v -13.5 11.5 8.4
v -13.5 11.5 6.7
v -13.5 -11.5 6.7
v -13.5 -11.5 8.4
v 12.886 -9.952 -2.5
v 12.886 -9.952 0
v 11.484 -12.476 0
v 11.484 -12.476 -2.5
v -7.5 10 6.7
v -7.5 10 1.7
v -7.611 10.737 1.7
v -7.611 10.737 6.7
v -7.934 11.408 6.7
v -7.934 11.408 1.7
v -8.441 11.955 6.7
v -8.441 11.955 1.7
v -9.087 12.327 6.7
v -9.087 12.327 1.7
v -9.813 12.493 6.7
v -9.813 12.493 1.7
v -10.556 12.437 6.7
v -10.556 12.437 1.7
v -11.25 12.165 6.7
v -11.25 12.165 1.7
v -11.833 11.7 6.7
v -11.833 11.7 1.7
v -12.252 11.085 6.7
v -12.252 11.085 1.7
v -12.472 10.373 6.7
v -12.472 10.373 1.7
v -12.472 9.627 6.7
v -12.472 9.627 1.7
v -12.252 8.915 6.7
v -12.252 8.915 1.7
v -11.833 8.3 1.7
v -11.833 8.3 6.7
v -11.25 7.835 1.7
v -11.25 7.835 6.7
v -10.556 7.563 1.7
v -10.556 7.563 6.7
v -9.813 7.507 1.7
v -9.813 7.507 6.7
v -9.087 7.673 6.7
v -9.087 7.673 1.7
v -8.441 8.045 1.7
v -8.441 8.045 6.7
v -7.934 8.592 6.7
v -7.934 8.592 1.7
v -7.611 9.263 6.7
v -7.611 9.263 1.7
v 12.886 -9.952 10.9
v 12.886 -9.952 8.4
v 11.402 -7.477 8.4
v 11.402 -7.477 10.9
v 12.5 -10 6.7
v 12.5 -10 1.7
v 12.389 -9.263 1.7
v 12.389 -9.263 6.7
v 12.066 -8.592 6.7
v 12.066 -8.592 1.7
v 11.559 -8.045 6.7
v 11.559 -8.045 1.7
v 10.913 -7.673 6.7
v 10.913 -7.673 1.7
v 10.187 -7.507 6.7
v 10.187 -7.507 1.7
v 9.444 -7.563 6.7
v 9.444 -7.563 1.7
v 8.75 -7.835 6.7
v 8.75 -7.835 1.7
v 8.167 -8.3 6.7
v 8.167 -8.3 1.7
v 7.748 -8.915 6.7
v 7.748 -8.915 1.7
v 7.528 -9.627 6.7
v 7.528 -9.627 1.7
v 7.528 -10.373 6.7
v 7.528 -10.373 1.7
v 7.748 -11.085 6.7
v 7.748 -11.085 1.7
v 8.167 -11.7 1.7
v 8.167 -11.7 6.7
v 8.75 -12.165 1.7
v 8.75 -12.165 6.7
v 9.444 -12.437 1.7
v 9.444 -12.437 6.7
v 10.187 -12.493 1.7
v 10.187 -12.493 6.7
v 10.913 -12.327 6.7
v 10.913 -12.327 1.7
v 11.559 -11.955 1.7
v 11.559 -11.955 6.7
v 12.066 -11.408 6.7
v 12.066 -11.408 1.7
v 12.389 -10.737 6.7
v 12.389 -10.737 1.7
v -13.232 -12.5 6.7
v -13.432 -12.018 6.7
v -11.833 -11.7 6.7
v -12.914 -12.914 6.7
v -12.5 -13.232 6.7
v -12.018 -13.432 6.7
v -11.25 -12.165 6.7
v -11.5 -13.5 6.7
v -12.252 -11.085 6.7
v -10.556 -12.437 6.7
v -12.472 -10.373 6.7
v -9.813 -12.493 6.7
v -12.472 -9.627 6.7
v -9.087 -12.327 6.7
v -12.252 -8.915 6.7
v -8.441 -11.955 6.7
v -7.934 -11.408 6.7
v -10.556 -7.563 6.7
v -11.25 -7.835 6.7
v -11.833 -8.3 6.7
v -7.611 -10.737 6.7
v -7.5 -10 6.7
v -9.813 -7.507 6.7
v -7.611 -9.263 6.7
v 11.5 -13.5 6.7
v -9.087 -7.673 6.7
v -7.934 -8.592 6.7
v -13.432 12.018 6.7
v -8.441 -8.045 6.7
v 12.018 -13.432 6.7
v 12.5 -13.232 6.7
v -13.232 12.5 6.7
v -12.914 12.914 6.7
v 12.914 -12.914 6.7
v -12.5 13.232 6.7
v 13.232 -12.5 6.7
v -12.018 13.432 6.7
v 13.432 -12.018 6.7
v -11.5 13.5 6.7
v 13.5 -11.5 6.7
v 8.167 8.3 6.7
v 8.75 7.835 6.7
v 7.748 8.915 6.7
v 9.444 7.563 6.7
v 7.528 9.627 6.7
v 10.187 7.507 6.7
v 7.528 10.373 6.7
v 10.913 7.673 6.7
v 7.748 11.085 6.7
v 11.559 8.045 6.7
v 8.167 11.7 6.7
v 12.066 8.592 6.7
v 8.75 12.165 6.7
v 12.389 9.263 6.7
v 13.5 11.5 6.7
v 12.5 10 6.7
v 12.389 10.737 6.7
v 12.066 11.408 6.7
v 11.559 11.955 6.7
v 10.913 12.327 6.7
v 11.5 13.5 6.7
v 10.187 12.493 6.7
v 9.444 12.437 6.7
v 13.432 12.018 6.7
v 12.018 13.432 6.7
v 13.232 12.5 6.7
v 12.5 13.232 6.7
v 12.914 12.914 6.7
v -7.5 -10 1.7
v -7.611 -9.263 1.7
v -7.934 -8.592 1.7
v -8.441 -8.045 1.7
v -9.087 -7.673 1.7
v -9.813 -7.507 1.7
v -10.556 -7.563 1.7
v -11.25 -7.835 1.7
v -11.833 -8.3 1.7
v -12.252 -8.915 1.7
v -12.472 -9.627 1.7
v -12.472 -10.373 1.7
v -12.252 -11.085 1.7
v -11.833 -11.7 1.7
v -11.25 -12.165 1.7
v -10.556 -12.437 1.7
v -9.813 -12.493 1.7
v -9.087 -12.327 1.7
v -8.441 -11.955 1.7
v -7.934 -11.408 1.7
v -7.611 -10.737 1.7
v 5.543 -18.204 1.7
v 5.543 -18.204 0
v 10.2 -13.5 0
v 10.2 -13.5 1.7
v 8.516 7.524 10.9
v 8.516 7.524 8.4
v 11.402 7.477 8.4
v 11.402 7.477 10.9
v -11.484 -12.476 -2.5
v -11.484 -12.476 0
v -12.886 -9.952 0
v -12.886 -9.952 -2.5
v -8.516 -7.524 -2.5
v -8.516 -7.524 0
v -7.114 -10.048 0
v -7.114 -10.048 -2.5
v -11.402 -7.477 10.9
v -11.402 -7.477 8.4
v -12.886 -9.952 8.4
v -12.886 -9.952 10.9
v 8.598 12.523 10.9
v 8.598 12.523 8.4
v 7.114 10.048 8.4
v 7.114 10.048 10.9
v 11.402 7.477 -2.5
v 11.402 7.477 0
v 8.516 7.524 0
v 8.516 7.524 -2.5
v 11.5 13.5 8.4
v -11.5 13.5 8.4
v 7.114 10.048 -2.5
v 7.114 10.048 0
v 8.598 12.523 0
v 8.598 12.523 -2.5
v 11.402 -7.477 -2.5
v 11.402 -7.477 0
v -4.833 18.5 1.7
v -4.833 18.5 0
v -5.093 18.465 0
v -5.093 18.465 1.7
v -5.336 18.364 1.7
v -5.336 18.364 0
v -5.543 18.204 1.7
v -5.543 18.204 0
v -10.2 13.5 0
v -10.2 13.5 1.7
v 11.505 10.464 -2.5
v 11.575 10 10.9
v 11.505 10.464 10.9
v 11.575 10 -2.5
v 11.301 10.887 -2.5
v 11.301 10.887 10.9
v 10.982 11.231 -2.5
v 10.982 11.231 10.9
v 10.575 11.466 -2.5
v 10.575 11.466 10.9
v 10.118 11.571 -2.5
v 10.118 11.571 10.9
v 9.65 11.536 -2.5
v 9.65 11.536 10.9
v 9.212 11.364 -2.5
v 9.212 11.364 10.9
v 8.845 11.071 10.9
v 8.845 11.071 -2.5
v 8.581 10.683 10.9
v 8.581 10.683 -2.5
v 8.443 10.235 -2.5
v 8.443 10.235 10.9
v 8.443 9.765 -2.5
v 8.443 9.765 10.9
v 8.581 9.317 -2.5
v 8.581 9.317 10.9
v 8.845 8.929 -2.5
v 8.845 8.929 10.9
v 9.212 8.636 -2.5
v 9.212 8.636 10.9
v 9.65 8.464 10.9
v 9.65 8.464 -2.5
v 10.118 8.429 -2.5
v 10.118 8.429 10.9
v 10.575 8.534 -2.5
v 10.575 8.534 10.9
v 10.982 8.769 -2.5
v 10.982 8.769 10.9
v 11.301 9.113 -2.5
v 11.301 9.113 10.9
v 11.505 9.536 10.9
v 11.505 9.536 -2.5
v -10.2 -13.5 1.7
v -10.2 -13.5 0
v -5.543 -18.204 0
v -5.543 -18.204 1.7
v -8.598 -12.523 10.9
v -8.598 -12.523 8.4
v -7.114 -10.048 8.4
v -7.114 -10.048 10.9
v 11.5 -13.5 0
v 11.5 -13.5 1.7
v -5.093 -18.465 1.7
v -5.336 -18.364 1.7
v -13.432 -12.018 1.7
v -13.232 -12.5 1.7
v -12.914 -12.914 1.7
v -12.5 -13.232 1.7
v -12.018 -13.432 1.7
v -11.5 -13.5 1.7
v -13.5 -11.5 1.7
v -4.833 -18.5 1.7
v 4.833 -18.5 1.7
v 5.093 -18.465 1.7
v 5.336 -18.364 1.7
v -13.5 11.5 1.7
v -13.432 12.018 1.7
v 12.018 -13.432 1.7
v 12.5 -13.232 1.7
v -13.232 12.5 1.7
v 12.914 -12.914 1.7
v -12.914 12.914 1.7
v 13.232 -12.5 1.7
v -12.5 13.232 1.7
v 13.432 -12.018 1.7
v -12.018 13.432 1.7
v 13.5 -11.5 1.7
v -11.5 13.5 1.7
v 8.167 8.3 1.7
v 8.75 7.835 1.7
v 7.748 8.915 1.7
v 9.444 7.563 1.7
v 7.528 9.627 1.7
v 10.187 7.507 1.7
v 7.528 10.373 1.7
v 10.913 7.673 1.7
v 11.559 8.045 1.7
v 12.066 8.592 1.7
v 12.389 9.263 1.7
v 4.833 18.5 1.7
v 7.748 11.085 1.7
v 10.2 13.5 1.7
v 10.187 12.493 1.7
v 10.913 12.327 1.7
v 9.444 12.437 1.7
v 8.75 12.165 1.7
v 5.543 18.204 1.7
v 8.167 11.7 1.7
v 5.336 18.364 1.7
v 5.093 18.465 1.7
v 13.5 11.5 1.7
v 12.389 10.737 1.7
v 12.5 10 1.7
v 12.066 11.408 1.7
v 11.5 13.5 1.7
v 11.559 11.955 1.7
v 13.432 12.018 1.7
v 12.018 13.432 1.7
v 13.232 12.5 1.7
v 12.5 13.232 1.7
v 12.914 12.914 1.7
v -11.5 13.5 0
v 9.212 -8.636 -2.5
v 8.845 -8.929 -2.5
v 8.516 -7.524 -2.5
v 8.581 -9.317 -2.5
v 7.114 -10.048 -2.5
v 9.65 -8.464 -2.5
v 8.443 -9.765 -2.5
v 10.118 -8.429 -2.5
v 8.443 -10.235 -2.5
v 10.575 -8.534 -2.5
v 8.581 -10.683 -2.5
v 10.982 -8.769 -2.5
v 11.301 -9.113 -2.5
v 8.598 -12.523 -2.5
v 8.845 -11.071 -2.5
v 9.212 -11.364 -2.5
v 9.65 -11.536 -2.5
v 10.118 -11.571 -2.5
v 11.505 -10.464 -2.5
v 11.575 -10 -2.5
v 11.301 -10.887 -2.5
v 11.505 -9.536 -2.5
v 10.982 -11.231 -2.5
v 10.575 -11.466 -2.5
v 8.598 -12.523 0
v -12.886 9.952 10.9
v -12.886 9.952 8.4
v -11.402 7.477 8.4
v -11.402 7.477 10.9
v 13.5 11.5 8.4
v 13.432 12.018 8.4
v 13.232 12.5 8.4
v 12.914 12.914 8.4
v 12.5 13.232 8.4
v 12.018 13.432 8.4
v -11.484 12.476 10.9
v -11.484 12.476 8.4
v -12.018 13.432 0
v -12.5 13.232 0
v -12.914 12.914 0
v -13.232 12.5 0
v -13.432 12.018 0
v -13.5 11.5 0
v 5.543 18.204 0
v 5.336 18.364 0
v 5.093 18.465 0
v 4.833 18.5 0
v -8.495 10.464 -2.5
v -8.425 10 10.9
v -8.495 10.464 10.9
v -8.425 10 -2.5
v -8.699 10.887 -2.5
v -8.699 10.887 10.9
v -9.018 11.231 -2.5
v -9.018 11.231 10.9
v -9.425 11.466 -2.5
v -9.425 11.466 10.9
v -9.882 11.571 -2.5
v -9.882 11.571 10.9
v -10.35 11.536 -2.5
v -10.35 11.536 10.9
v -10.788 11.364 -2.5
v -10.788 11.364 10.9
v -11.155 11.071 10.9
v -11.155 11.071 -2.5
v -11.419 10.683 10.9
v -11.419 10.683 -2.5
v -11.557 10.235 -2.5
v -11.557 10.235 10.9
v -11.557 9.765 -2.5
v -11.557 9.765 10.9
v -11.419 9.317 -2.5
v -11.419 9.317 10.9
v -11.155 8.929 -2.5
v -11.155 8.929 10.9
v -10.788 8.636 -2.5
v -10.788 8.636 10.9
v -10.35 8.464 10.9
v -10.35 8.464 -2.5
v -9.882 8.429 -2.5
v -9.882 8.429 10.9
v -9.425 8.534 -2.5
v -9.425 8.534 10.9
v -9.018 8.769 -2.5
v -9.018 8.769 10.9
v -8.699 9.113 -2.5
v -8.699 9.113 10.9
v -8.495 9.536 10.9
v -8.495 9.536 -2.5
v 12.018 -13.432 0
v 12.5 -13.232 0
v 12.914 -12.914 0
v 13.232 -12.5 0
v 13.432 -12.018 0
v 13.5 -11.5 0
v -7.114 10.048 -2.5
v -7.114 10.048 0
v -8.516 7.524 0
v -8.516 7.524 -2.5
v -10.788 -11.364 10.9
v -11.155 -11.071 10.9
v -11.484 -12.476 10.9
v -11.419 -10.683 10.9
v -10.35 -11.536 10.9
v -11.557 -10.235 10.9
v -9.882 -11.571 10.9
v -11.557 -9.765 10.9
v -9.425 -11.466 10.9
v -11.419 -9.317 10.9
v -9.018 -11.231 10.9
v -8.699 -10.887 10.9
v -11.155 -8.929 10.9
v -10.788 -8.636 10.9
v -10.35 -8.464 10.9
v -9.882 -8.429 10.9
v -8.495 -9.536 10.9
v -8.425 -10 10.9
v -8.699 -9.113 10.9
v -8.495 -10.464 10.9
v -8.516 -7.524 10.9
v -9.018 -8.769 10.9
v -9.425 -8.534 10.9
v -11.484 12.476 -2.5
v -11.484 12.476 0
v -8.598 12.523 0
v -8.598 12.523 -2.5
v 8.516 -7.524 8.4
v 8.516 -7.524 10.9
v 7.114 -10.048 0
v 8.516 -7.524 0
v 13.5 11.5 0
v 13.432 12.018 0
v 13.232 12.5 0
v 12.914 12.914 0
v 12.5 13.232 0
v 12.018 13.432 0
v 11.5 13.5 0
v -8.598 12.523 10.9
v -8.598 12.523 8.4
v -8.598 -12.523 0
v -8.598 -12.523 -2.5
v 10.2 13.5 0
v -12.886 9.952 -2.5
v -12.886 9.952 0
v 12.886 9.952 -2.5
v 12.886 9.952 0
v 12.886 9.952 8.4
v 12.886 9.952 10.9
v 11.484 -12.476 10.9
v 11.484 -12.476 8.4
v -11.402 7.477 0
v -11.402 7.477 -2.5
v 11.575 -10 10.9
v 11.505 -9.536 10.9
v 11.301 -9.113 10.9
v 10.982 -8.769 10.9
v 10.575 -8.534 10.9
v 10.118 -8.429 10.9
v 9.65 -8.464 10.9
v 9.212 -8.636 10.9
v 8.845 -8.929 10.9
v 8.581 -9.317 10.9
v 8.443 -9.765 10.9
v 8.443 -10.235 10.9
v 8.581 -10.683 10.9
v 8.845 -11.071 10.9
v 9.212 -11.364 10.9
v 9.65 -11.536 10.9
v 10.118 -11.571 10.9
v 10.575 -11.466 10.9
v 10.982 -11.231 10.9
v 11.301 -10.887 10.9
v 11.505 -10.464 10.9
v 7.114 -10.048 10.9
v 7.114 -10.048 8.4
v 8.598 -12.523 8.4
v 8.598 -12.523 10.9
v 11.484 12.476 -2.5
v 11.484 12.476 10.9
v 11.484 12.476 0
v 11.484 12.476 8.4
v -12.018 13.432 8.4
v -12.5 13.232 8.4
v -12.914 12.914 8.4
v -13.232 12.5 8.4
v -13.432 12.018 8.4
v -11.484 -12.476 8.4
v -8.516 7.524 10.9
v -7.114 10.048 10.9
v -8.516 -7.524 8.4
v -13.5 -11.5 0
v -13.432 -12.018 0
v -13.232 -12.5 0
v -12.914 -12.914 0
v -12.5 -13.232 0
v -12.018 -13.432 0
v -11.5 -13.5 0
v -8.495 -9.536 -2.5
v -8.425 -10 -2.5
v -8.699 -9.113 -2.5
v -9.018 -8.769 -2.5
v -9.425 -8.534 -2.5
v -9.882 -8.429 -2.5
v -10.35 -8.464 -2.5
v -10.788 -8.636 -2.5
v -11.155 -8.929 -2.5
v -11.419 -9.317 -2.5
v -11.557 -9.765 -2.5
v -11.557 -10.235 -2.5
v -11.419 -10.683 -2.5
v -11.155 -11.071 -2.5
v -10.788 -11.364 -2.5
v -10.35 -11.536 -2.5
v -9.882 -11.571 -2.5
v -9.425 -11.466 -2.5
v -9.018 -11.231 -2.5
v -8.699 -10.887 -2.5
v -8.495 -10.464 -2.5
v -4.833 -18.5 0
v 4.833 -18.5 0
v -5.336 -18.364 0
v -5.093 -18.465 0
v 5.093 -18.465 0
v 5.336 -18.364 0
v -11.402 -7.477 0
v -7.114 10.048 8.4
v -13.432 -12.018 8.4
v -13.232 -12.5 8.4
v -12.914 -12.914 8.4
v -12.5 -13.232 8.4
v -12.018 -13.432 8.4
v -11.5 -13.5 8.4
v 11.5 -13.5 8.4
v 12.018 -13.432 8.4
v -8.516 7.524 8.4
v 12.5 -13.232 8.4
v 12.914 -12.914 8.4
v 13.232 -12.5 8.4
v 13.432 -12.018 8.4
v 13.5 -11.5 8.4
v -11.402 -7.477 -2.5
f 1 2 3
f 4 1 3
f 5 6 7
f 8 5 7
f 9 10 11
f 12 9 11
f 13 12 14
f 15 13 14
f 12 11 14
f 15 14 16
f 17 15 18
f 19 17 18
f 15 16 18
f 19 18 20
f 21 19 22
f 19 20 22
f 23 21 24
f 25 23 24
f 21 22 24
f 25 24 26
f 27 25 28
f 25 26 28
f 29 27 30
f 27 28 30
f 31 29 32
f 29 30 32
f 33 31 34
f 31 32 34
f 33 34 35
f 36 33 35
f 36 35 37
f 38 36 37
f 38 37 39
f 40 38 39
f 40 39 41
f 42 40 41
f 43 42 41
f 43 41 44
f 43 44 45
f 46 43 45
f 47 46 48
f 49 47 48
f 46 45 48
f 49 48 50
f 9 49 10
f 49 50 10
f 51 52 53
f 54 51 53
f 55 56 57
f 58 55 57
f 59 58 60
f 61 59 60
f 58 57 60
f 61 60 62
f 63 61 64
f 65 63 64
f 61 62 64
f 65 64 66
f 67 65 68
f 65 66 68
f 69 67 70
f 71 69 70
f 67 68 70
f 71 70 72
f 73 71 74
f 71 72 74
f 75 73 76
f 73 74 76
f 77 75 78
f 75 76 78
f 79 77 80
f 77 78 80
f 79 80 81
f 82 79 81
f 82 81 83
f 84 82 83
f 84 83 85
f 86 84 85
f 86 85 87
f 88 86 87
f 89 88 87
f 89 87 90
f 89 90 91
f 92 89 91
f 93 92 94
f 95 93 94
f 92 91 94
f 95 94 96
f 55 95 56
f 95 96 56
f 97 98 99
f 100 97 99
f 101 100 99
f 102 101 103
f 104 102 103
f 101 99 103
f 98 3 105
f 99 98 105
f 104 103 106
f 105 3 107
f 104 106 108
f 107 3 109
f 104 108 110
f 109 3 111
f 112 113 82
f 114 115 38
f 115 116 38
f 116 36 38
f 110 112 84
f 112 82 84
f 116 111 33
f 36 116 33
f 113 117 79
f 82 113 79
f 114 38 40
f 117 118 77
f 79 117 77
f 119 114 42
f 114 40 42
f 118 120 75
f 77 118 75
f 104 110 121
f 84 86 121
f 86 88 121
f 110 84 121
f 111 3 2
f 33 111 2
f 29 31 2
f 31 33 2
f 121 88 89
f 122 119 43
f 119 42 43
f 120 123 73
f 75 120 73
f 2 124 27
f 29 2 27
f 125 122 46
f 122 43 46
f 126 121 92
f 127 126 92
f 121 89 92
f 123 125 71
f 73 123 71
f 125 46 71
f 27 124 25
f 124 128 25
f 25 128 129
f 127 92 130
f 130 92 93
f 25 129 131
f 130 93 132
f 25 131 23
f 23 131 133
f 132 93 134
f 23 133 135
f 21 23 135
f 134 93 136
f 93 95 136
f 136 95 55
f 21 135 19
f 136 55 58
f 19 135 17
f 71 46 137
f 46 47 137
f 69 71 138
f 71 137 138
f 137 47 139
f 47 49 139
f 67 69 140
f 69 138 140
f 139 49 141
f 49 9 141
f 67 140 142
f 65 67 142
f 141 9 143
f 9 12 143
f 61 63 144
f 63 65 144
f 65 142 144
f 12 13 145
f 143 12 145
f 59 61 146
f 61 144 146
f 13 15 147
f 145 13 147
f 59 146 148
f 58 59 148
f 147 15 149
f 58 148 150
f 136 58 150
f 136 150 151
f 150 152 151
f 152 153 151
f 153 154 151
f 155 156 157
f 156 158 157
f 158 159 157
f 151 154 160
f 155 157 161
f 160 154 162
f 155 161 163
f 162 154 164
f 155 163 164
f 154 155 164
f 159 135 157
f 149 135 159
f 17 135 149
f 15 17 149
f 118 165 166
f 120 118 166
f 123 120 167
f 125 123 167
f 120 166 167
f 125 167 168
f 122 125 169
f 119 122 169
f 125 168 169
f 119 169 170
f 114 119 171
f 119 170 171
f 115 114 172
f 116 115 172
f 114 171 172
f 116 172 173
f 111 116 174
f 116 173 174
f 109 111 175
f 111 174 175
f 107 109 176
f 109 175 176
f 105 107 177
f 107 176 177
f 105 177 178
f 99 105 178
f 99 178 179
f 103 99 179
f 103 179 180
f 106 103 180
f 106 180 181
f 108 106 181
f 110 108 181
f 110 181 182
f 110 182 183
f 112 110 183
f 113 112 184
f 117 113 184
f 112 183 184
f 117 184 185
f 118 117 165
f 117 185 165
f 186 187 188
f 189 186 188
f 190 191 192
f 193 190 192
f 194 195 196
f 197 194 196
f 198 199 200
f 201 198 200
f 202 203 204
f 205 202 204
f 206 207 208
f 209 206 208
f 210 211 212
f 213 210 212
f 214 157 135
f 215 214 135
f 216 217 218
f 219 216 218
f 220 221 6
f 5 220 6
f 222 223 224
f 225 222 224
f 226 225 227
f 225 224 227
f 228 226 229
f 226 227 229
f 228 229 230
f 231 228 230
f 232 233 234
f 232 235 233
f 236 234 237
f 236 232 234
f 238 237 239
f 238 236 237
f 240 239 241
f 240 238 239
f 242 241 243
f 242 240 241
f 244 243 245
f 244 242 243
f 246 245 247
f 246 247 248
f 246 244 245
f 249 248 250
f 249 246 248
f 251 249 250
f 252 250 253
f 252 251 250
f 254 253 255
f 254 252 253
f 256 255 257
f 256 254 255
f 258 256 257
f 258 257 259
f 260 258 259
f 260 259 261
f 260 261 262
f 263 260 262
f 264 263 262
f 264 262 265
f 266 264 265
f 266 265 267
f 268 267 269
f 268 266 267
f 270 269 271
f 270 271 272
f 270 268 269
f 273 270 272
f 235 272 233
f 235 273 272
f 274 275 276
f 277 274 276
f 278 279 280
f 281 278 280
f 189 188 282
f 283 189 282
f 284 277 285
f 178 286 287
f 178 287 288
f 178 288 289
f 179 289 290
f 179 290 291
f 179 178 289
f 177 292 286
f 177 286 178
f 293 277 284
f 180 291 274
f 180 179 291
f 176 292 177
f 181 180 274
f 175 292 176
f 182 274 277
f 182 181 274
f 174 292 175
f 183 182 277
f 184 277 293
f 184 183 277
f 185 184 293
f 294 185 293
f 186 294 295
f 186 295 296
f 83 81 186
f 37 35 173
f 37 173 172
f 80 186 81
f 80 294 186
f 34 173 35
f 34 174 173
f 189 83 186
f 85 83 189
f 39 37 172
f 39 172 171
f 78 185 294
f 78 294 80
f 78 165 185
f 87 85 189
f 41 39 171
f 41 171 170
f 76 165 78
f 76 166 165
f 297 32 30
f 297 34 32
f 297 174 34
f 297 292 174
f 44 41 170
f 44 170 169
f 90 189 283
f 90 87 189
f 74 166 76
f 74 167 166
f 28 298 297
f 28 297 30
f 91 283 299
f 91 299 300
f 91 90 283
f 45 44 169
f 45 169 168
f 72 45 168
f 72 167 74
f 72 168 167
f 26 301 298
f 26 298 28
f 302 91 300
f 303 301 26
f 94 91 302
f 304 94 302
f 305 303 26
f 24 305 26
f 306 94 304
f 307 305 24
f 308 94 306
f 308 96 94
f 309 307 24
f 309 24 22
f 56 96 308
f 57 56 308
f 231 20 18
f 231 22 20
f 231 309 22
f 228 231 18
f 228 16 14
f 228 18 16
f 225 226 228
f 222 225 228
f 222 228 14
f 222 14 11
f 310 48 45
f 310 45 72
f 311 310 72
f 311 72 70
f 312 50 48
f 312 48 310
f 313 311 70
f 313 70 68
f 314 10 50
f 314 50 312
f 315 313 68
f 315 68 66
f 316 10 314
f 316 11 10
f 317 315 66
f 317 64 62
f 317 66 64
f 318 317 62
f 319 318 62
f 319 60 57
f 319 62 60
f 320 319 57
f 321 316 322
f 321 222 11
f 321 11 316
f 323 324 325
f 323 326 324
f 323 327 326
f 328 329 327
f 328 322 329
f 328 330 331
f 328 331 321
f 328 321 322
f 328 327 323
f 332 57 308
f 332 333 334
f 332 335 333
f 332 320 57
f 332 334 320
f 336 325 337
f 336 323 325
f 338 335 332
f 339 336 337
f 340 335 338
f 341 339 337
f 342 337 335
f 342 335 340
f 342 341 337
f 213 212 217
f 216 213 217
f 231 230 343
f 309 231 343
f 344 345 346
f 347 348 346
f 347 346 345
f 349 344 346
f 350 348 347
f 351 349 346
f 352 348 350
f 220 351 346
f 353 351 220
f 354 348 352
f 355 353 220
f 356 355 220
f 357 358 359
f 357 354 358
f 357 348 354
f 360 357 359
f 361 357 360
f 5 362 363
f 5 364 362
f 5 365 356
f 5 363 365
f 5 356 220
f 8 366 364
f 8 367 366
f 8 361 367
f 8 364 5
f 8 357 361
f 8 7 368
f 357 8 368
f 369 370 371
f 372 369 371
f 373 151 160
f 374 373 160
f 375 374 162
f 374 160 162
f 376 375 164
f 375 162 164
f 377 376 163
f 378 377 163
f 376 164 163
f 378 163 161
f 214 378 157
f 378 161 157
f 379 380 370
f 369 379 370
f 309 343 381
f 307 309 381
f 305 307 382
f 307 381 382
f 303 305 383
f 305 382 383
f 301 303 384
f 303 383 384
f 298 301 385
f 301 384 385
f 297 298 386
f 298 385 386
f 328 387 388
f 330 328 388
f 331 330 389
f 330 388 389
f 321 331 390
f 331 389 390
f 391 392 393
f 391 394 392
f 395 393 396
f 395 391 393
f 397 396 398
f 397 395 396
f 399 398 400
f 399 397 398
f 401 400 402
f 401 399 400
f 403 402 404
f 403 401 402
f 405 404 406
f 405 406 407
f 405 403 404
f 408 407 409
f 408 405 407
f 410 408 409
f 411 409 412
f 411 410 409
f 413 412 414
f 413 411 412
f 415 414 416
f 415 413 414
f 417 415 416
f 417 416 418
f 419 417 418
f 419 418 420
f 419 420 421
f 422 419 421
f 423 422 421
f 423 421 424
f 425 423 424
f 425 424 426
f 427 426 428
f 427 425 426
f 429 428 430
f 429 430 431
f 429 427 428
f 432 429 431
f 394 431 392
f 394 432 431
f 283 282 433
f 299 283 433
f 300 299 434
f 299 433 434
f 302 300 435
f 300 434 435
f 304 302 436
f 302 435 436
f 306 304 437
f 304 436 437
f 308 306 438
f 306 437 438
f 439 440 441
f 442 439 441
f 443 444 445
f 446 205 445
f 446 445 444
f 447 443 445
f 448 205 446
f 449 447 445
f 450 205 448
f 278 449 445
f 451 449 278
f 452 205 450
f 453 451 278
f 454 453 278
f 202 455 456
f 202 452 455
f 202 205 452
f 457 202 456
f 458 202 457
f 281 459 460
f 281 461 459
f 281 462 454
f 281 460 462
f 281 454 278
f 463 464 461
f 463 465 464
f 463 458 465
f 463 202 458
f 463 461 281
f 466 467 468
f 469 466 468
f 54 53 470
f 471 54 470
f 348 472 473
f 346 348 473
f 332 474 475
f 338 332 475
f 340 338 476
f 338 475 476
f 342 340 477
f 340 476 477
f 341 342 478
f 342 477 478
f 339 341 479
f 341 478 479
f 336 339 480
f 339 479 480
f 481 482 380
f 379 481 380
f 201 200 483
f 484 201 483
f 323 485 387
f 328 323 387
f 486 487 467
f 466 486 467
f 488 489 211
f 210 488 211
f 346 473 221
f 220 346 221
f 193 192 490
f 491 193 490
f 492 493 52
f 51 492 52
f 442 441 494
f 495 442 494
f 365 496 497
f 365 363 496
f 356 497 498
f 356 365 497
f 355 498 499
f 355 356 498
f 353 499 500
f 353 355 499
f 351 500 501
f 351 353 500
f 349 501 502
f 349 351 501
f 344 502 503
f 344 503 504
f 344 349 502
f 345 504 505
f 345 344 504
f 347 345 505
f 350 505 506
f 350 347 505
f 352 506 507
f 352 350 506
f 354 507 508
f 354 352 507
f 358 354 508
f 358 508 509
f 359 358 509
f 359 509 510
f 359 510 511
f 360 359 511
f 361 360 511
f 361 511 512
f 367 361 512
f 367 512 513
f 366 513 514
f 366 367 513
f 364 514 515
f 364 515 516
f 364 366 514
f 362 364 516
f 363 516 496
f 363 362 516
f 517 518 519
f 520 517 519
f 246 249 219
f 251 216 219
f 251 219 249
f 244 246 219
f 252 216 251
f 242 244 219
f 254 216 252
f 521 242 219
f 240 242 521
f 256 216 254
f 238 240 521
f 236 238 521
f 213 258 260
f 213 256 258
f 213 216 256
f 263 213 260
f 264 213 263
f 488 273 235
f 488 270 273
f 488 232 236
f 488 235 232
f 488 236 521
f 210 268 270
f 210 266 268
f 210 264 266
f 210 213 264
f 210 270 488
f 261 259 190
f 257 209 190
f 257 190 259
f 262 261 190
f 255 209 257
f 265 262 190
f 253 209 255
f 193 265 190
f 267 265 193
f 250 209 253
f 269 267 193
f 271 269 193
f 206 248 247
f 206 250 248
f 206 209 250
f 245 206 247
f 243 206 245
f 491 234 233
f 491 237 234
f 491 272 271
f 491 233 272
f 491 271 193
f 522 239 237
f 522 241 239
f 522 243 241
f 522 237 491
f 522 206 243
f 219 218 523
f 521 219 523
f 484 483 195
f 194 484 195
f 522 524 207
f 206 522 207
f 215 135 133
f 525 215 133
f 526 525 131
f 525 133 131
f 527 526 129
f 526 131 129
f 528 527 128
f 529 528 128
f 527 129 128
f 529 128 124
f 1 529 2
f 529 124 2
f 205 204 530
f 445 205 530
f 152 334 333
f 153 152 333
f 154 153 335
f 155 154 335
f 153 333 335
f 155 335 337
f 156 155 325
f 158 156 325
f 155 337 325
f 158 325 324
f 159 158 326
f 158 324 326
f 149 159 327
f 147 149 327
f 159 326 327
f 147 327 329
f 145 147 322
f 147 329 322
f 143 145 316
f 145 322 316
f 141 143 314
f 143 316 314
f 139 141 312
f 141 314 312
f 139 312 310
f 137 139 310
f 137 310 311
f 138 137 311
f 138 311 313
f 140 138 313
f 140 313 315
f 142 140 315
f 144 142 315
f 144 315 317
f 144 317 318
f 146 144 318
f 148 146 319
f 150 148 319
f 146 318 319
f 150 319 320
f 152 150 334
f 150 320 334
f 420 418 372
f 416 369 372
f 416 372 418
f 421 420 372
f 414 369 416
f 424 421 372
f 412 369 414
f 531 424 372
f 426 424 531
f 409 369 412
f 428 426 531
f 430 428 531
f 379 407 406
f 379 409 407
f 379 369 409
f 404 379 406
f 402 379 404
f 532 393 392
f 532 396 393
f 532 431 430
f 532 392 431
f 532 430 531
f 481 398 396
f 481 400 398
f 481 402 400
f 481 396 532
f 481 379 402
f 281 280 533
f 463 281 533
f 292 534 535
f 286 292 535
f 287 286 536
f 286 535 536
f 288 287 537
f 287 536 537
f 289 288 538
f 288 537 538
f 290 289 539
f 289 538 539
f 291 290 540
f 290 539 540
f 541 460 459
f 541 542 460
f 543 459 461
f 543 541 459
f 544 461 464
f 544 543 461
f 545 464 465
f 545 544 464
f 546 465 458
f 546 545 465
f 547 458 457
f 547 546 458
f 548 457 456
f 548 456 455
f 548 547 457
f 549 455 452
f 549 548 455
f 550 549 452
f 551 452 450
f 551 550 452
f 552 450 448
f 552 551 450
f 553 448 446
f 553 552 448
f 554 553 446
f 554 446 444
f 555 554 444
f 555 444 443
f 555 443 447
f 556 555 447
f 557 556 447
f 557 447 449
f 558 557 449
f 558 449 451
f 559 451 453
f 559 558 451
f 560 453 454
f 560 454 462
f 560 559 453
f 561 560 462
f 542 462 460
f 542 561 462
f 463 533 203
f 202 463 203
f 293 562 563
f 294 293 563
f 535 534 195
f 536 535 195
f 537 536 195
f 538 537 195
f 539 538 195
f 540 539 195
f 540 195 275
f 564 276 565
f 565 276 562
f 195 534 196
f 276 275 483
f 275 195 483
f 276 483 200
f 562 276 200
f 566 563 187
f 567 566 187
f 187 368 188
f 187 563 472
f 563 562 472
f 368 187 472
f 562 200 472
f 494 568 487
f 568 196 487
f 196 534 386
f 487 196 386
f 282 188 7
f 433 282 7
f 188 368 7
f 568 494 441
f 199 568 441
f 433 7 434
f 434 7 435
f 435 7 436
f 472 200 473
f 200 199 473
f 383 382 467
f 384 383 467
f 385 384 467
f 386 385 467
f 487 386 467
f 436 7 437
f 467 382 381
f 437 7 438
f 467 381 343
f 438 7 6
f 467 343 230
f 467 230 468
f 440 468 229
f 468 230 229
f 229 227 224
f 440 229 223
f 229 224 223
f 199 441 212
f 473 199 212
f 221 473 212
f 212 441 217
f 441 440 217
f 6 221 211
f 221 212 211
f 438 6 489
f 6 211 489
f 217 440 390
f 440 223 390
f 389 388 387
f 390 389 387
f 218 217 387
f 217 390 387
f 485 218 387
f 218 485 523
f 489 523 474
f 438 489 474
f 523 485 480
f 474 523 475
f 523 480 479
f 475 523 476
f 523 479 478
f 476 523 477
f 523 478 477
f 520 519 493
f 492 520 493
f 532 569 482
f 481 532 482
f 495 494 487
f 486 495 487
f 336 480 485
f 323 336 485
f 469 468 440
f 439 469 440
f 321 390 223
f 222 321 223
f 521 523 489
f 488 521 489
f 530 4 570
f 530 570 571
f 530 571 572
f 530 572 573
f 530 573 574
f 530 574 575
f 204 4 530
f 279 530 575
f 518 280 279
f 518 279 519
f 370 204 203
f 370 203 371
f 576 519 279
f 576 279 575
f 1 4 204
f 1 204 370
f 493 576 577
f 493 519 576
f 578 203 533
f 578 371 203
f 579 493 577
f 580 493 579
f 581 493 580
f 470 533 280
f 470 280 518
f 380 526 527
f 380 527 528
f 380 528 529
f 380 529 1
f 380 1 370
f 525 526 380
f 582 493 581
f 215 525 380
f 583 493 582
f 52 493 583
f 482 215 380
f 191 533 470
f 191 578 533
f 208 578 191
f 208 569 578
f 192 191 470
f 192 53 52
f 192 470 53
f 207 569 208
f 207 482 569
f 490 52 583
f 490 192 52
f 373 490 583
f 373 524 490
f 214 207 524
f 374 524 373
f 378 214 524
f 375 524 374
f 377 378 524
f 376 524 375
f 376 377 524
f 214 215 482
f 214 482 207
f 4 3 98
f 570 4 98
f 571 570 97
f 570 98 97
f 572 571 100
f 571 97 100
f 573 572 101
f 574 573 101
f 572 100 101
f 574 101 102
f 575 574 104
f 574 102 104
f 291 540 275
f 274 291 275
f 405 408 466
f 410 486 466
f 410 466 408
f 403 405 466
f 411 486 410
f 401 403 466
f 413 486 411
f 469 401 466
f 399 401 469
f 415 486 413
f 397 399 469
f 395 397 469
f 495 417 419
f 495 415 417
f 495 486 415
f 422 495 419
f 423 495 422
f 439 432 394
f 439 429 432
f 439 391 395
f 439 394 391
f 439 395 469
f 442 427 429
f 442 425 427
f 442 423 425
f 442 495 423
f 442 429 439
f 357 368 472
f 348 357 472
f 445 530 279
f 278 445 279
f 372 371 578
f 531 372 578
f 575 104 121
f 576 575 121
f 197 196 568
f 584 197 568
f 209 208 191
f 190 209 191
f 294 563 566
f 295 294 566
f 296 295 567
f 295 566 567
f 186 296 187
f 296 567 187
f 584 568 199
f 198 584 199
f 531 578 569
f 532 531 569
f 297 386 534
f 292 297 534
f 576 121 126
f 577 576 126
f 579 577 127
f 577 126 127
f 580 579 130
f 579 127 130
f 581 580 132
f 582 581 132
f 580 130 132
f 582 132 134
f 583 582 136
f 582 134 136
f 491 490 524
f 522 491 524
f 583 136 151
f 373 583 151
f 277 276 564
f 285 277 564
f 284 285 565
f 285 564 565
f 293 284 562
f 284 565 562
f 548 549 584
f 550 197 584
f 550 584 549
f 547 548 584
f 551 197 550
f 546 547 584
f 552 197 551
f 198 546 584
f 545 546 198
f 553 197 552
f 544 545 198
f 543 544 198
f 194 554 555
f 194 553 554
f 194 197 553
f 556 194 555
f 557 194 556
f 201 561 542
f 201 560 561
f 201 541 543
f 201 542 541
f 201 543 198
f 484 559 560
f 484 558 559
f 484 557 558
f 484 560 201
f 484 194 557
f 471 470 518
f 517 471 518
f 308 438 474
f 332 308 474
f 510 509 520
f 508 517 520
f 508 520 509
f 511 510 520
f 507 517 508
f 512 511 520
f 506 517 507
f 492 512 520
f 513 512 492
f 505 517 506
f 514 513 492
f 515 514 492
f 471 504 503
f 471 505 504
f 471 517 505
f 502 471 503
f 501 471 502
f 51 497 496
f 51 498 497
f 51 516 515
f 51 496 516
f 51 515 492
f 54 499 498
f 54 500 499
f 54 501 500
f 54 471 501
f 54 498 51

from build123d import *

# Parameters (mm, degrees)
F1_R      = 1.575
F2_DEPTH  = 1.7
F3_R      = 1.575
F4_DEPTH  = 2.5
F5_R      = 2.5
F5_R_2    = 1.575
F6_DEPTH  = 5
F7_R      = 1.575
F8_DEPTH  = 1.7
F9_R      = 1.575
F10_DEPTH = 2.5


with BuildPart() as f2:
    # F1 (on Top) → F2 (new body)
    with BuildSketch(Plane.XY):
        with BuildLine():
            Line((-10.2, 13.5), (-11.5, 13.5))
            ThreePointArc((-11.5, 13.5), (-12.9142135624, 12.9142135624), (-13.5, 11.5))
            Line((-13.5, 11.5), (-13.5, -11.5))
            ThreePointArc((-13.5, -11.5), (-12.9142135624, -12.9142135624), (-11.5, -13.5))
            Line((-11.5, -13.5), (-10.2, -13.5))
            Line((-10.2, -13.5), (10.2, -13.5))
            Line((10.2, -13.5), (11.5, -13.5))
            ThreePointArc((11.5, -13.5), (12.9142135624, -12.9142135624), (13.5, -11.5))
            Line((13.5, -11.5), (13.5, 11.5))
            ThreePointArc((13.5, 11.5), (12.9142135624, 12.9142135624), (11.5, 13.5))
            Line((11.5, 13.5), (10.2, 13.5))
            Line((10.2, 13.5), (-10.2, 13.5))
        make_face()
        with Locations((-10, -10)):
            Circle(F1_R, mode=Mode.SUBTRACT)
        with Locations((10, -10)):
            Circle(F1_R, mode=Mode.SUBTRACT)
        with Locations((-10, 10)):
            Circle(F1_R, mode=Mode.SUBTRACT)
        with Locations((10, 10)):
            Circle(F1_R, mode=Mode.SUBTRACT)
        with BuildLine():
            Line((-5.5434908481, 18.2035445979), (-10.2, 13.5))
            Line((-10.2, 13.5), (10.2, 13.5))
            Line((10.2, 13.5), (5.5434908481, 18.2035445979))
            ThreePointArc((5.5434908481, 18.2035445979), (5.2178432469, 18.4229151093), (4.832839739, 18.5))
            Line((4.832839739, 18.5), (-4.832839739, 18.5))
            ThreePointArc((-4.832839739, 18.5), (-5.2178432469, 18.4229151093), (-5.5434908481, 18.2035445979))
        make_face()
        with BuildLine():
            Line((10.2, -13.5), (-10.2, -13.5))
            Line((-10.2, -13.5), (-5.5434908481, -18.2035445979))
            ThreePointArc((-5.5434908481, -18.2035445979), (-5.2178432469, -18.4229151093), (-4.832839739, -18.5))
            Line((-4.832839739, -18.5), (4.832839739, -18.5))
            ThreePointArc((4.832839739, -18.5), (5.2178432469, -18.4229151093), (5.5434908481, -18.2035445979))
            Line((5.5434908481, -18.2035445979), (10.2, -13.5))
        make_face()
    extrude(amount=F2_DEPTH)

    # F3 (on face) → F4 (join)
    with BuildSketch(Plane(origin=(0, 0, 0), x_dir=(1, 0, 0), z_dir=(0, 0, -1))):
        Polygon((-11.4020402321, -7.4765863358), (-12.8863604535, -9.952495626), (-11.4843202214, -12.4759092903), (-8.5979597679, -12.5234136642), (-7.1136395465, -10.047504374), (-8.5156797786, -7.5240907097), align=None)
        with Locations((-10, -10)):
            Circle(F3_R, mode=Mode.SUBTRACT)
        Polygon((-12.8863604535, 9.952495626), (-11.4020402321, 7.4765863358), (-8.5156797786, 7.5240907097), (-7.1136395465, 10.047504374), (-8.5979597679, 12.5234136642), (-11.4843202214, 12.4759092903), align=None)
        with Locations((-10, 10)):
            Circle(F3_R, mode=Mode.SUBTRACT)
        Polygon((11.4843202214, -12.4759092903), (12.8863604535, -9.952495626), (11.4020402321, -7.4765863358), (8.5156797786, -7.5240907097), (7.1136395465, -10.047504374), (8.5979597679, -12.5234136642), align=None)
        with Locations((10, -10)):
            Circle(F3_R, mode=Mode.SUBTRACT)
        Polygon((8.5979597679, 12.5234136642), (7.1136395465, 10.047504374), (8.5156797786, 7.5240907097), (11.4020402321, 7.4765863358), (12.8863604535, 9.952495626), (11.4843202214, 12.4759092903), align=None)
        with Locations((10, 10)):
            Circle(F3_R, mode=Mode.SUBTRACT)
    extrude(amount=F4_DEPTH)

    # F5 (on face) → F6 (join)
    with BuildSketch(Plane.XY.offset(1.7)):
        with Locations((-10, 10)):
            Circle(F5_R)
        with Locations((-10, 10)):
            Circle(F5_R_2, mode=Mode.SUBTRACT)
        with Locations((10, 10)):
            Circle(F5_R)
        with Locations((10, 10)):
            Circle(F5_R_2, mode=Mode.SUBTRACT)
        with Locations((10, -10)):
            Circle(F5_R)
        with Locations((10, -10)):
            Circle(F5_R_2, mode=Mode.SUBTRACT)
        with Locations((-10, -10)):
            Circle(F5_R)
        with Locations((-10, -10)):
            Circle(F5_R_2, mode=Mode.SUBTRACT)
    extrude(amount=F6_DEPTH)

    # F7 (on face) → F8 (join)
    with BuildSketch(Plane.XY.offset(6.7)):
        with BuildLine():
            Line((-11.5, -13.5), (11.5, -13.5))
            ThreePointArc((11.5, -13.5), (12.9142135624, -12.9142135624), (13.5, -11.5))
            Line((13.5, -11.5), (13.5, 11.5))
            ThreePointArc((13.5, 11.5), (12.9142135624, 12.9142135624), (11.5, 13.5))
            Line((11.5, 13.5), (-11.5, 13.5))
            ThreePointArc((-11.5, 13.5), (-12.9142135624, 12.9142135624), (-13.5, 11.5))
            Line((-13.5, 11.5), (-13.5, -11.5))
            ThreePointArc((-13.5, -11.5), (-12.9142135624, -12.9142135624), (-11.5, -13.5))
        make_face()
        with Locations((-10, -10)):
            Circle(F7_R, mode=Mode.SUBTRACT)
        with Locations((10, -10)):
            Circle(F7_R, mode=Mode.SUBTRACT)
        with Locations((-10, 10)):
            Circle(F7_R, mode=Mode.SUBTRACT)
        with Locations((10, 10)):
            Circle(F7_R, mode=Mode.SUBTRACT)
    extrude(amount=F8_DEPTH)

    # F9 (on face) → F10 (join)
    with BuildSketch(Plane.XY.offset(8.4)):
        Polygon((-11.4020402321, 7.4765863358), (-8.5156797786, 7.5240907097), (-7.1136395465, 10.047504374), (-8.5979597679, 12.5234136642), (-11.4843202214, 12.4759092903), (-12.8863604535, 9.952495626), align=None)
        with Locations((-10, 10)):
            Circle(F9_R, mode=Mode.SUBTRACT)
        Polygon((12.8863604535, -9.952495626), (11.4020402321, -7.4765863358), (8.5156797786, -7.5240907097), (7.1136395465, -10.047504374), (8.5979597679, -12.5234136642), (11.4843202214, -12.4759092903), align=None)
        with Locations((10, -10)):
            Circle(F9_R, mode=Mode.SUBTRACT)
        Polygon((12.8863604535, 9.952495626), (11.4843202214, 12.4759092903), (8.5979597679, 12.5234136642), (7.1136395465, 10.047504374), (8.5156797786, 7.5240907097), (11.4020402321, 7.4765863358), align=None)
        with Locations((10, 10)):
            Circle(F9_R, mode=Mode.SUBTRACT)
        Polygon((-11.4843202214, -12.4759092903), (-8.5979597679, -12.5234136642), (-7.1136395465, -10.047504374), (-8.5156797786, -7.5240907097), (-11.4020402321, -7.4765863358), (-12.8863604535, -9.952495626), align=None)
        with Locations((-10, -10)):
            Circle(F9_R, mode=Mode.SUBTRACT)
    extrude(amount=F10_DEPTH)


solid = f2.part
